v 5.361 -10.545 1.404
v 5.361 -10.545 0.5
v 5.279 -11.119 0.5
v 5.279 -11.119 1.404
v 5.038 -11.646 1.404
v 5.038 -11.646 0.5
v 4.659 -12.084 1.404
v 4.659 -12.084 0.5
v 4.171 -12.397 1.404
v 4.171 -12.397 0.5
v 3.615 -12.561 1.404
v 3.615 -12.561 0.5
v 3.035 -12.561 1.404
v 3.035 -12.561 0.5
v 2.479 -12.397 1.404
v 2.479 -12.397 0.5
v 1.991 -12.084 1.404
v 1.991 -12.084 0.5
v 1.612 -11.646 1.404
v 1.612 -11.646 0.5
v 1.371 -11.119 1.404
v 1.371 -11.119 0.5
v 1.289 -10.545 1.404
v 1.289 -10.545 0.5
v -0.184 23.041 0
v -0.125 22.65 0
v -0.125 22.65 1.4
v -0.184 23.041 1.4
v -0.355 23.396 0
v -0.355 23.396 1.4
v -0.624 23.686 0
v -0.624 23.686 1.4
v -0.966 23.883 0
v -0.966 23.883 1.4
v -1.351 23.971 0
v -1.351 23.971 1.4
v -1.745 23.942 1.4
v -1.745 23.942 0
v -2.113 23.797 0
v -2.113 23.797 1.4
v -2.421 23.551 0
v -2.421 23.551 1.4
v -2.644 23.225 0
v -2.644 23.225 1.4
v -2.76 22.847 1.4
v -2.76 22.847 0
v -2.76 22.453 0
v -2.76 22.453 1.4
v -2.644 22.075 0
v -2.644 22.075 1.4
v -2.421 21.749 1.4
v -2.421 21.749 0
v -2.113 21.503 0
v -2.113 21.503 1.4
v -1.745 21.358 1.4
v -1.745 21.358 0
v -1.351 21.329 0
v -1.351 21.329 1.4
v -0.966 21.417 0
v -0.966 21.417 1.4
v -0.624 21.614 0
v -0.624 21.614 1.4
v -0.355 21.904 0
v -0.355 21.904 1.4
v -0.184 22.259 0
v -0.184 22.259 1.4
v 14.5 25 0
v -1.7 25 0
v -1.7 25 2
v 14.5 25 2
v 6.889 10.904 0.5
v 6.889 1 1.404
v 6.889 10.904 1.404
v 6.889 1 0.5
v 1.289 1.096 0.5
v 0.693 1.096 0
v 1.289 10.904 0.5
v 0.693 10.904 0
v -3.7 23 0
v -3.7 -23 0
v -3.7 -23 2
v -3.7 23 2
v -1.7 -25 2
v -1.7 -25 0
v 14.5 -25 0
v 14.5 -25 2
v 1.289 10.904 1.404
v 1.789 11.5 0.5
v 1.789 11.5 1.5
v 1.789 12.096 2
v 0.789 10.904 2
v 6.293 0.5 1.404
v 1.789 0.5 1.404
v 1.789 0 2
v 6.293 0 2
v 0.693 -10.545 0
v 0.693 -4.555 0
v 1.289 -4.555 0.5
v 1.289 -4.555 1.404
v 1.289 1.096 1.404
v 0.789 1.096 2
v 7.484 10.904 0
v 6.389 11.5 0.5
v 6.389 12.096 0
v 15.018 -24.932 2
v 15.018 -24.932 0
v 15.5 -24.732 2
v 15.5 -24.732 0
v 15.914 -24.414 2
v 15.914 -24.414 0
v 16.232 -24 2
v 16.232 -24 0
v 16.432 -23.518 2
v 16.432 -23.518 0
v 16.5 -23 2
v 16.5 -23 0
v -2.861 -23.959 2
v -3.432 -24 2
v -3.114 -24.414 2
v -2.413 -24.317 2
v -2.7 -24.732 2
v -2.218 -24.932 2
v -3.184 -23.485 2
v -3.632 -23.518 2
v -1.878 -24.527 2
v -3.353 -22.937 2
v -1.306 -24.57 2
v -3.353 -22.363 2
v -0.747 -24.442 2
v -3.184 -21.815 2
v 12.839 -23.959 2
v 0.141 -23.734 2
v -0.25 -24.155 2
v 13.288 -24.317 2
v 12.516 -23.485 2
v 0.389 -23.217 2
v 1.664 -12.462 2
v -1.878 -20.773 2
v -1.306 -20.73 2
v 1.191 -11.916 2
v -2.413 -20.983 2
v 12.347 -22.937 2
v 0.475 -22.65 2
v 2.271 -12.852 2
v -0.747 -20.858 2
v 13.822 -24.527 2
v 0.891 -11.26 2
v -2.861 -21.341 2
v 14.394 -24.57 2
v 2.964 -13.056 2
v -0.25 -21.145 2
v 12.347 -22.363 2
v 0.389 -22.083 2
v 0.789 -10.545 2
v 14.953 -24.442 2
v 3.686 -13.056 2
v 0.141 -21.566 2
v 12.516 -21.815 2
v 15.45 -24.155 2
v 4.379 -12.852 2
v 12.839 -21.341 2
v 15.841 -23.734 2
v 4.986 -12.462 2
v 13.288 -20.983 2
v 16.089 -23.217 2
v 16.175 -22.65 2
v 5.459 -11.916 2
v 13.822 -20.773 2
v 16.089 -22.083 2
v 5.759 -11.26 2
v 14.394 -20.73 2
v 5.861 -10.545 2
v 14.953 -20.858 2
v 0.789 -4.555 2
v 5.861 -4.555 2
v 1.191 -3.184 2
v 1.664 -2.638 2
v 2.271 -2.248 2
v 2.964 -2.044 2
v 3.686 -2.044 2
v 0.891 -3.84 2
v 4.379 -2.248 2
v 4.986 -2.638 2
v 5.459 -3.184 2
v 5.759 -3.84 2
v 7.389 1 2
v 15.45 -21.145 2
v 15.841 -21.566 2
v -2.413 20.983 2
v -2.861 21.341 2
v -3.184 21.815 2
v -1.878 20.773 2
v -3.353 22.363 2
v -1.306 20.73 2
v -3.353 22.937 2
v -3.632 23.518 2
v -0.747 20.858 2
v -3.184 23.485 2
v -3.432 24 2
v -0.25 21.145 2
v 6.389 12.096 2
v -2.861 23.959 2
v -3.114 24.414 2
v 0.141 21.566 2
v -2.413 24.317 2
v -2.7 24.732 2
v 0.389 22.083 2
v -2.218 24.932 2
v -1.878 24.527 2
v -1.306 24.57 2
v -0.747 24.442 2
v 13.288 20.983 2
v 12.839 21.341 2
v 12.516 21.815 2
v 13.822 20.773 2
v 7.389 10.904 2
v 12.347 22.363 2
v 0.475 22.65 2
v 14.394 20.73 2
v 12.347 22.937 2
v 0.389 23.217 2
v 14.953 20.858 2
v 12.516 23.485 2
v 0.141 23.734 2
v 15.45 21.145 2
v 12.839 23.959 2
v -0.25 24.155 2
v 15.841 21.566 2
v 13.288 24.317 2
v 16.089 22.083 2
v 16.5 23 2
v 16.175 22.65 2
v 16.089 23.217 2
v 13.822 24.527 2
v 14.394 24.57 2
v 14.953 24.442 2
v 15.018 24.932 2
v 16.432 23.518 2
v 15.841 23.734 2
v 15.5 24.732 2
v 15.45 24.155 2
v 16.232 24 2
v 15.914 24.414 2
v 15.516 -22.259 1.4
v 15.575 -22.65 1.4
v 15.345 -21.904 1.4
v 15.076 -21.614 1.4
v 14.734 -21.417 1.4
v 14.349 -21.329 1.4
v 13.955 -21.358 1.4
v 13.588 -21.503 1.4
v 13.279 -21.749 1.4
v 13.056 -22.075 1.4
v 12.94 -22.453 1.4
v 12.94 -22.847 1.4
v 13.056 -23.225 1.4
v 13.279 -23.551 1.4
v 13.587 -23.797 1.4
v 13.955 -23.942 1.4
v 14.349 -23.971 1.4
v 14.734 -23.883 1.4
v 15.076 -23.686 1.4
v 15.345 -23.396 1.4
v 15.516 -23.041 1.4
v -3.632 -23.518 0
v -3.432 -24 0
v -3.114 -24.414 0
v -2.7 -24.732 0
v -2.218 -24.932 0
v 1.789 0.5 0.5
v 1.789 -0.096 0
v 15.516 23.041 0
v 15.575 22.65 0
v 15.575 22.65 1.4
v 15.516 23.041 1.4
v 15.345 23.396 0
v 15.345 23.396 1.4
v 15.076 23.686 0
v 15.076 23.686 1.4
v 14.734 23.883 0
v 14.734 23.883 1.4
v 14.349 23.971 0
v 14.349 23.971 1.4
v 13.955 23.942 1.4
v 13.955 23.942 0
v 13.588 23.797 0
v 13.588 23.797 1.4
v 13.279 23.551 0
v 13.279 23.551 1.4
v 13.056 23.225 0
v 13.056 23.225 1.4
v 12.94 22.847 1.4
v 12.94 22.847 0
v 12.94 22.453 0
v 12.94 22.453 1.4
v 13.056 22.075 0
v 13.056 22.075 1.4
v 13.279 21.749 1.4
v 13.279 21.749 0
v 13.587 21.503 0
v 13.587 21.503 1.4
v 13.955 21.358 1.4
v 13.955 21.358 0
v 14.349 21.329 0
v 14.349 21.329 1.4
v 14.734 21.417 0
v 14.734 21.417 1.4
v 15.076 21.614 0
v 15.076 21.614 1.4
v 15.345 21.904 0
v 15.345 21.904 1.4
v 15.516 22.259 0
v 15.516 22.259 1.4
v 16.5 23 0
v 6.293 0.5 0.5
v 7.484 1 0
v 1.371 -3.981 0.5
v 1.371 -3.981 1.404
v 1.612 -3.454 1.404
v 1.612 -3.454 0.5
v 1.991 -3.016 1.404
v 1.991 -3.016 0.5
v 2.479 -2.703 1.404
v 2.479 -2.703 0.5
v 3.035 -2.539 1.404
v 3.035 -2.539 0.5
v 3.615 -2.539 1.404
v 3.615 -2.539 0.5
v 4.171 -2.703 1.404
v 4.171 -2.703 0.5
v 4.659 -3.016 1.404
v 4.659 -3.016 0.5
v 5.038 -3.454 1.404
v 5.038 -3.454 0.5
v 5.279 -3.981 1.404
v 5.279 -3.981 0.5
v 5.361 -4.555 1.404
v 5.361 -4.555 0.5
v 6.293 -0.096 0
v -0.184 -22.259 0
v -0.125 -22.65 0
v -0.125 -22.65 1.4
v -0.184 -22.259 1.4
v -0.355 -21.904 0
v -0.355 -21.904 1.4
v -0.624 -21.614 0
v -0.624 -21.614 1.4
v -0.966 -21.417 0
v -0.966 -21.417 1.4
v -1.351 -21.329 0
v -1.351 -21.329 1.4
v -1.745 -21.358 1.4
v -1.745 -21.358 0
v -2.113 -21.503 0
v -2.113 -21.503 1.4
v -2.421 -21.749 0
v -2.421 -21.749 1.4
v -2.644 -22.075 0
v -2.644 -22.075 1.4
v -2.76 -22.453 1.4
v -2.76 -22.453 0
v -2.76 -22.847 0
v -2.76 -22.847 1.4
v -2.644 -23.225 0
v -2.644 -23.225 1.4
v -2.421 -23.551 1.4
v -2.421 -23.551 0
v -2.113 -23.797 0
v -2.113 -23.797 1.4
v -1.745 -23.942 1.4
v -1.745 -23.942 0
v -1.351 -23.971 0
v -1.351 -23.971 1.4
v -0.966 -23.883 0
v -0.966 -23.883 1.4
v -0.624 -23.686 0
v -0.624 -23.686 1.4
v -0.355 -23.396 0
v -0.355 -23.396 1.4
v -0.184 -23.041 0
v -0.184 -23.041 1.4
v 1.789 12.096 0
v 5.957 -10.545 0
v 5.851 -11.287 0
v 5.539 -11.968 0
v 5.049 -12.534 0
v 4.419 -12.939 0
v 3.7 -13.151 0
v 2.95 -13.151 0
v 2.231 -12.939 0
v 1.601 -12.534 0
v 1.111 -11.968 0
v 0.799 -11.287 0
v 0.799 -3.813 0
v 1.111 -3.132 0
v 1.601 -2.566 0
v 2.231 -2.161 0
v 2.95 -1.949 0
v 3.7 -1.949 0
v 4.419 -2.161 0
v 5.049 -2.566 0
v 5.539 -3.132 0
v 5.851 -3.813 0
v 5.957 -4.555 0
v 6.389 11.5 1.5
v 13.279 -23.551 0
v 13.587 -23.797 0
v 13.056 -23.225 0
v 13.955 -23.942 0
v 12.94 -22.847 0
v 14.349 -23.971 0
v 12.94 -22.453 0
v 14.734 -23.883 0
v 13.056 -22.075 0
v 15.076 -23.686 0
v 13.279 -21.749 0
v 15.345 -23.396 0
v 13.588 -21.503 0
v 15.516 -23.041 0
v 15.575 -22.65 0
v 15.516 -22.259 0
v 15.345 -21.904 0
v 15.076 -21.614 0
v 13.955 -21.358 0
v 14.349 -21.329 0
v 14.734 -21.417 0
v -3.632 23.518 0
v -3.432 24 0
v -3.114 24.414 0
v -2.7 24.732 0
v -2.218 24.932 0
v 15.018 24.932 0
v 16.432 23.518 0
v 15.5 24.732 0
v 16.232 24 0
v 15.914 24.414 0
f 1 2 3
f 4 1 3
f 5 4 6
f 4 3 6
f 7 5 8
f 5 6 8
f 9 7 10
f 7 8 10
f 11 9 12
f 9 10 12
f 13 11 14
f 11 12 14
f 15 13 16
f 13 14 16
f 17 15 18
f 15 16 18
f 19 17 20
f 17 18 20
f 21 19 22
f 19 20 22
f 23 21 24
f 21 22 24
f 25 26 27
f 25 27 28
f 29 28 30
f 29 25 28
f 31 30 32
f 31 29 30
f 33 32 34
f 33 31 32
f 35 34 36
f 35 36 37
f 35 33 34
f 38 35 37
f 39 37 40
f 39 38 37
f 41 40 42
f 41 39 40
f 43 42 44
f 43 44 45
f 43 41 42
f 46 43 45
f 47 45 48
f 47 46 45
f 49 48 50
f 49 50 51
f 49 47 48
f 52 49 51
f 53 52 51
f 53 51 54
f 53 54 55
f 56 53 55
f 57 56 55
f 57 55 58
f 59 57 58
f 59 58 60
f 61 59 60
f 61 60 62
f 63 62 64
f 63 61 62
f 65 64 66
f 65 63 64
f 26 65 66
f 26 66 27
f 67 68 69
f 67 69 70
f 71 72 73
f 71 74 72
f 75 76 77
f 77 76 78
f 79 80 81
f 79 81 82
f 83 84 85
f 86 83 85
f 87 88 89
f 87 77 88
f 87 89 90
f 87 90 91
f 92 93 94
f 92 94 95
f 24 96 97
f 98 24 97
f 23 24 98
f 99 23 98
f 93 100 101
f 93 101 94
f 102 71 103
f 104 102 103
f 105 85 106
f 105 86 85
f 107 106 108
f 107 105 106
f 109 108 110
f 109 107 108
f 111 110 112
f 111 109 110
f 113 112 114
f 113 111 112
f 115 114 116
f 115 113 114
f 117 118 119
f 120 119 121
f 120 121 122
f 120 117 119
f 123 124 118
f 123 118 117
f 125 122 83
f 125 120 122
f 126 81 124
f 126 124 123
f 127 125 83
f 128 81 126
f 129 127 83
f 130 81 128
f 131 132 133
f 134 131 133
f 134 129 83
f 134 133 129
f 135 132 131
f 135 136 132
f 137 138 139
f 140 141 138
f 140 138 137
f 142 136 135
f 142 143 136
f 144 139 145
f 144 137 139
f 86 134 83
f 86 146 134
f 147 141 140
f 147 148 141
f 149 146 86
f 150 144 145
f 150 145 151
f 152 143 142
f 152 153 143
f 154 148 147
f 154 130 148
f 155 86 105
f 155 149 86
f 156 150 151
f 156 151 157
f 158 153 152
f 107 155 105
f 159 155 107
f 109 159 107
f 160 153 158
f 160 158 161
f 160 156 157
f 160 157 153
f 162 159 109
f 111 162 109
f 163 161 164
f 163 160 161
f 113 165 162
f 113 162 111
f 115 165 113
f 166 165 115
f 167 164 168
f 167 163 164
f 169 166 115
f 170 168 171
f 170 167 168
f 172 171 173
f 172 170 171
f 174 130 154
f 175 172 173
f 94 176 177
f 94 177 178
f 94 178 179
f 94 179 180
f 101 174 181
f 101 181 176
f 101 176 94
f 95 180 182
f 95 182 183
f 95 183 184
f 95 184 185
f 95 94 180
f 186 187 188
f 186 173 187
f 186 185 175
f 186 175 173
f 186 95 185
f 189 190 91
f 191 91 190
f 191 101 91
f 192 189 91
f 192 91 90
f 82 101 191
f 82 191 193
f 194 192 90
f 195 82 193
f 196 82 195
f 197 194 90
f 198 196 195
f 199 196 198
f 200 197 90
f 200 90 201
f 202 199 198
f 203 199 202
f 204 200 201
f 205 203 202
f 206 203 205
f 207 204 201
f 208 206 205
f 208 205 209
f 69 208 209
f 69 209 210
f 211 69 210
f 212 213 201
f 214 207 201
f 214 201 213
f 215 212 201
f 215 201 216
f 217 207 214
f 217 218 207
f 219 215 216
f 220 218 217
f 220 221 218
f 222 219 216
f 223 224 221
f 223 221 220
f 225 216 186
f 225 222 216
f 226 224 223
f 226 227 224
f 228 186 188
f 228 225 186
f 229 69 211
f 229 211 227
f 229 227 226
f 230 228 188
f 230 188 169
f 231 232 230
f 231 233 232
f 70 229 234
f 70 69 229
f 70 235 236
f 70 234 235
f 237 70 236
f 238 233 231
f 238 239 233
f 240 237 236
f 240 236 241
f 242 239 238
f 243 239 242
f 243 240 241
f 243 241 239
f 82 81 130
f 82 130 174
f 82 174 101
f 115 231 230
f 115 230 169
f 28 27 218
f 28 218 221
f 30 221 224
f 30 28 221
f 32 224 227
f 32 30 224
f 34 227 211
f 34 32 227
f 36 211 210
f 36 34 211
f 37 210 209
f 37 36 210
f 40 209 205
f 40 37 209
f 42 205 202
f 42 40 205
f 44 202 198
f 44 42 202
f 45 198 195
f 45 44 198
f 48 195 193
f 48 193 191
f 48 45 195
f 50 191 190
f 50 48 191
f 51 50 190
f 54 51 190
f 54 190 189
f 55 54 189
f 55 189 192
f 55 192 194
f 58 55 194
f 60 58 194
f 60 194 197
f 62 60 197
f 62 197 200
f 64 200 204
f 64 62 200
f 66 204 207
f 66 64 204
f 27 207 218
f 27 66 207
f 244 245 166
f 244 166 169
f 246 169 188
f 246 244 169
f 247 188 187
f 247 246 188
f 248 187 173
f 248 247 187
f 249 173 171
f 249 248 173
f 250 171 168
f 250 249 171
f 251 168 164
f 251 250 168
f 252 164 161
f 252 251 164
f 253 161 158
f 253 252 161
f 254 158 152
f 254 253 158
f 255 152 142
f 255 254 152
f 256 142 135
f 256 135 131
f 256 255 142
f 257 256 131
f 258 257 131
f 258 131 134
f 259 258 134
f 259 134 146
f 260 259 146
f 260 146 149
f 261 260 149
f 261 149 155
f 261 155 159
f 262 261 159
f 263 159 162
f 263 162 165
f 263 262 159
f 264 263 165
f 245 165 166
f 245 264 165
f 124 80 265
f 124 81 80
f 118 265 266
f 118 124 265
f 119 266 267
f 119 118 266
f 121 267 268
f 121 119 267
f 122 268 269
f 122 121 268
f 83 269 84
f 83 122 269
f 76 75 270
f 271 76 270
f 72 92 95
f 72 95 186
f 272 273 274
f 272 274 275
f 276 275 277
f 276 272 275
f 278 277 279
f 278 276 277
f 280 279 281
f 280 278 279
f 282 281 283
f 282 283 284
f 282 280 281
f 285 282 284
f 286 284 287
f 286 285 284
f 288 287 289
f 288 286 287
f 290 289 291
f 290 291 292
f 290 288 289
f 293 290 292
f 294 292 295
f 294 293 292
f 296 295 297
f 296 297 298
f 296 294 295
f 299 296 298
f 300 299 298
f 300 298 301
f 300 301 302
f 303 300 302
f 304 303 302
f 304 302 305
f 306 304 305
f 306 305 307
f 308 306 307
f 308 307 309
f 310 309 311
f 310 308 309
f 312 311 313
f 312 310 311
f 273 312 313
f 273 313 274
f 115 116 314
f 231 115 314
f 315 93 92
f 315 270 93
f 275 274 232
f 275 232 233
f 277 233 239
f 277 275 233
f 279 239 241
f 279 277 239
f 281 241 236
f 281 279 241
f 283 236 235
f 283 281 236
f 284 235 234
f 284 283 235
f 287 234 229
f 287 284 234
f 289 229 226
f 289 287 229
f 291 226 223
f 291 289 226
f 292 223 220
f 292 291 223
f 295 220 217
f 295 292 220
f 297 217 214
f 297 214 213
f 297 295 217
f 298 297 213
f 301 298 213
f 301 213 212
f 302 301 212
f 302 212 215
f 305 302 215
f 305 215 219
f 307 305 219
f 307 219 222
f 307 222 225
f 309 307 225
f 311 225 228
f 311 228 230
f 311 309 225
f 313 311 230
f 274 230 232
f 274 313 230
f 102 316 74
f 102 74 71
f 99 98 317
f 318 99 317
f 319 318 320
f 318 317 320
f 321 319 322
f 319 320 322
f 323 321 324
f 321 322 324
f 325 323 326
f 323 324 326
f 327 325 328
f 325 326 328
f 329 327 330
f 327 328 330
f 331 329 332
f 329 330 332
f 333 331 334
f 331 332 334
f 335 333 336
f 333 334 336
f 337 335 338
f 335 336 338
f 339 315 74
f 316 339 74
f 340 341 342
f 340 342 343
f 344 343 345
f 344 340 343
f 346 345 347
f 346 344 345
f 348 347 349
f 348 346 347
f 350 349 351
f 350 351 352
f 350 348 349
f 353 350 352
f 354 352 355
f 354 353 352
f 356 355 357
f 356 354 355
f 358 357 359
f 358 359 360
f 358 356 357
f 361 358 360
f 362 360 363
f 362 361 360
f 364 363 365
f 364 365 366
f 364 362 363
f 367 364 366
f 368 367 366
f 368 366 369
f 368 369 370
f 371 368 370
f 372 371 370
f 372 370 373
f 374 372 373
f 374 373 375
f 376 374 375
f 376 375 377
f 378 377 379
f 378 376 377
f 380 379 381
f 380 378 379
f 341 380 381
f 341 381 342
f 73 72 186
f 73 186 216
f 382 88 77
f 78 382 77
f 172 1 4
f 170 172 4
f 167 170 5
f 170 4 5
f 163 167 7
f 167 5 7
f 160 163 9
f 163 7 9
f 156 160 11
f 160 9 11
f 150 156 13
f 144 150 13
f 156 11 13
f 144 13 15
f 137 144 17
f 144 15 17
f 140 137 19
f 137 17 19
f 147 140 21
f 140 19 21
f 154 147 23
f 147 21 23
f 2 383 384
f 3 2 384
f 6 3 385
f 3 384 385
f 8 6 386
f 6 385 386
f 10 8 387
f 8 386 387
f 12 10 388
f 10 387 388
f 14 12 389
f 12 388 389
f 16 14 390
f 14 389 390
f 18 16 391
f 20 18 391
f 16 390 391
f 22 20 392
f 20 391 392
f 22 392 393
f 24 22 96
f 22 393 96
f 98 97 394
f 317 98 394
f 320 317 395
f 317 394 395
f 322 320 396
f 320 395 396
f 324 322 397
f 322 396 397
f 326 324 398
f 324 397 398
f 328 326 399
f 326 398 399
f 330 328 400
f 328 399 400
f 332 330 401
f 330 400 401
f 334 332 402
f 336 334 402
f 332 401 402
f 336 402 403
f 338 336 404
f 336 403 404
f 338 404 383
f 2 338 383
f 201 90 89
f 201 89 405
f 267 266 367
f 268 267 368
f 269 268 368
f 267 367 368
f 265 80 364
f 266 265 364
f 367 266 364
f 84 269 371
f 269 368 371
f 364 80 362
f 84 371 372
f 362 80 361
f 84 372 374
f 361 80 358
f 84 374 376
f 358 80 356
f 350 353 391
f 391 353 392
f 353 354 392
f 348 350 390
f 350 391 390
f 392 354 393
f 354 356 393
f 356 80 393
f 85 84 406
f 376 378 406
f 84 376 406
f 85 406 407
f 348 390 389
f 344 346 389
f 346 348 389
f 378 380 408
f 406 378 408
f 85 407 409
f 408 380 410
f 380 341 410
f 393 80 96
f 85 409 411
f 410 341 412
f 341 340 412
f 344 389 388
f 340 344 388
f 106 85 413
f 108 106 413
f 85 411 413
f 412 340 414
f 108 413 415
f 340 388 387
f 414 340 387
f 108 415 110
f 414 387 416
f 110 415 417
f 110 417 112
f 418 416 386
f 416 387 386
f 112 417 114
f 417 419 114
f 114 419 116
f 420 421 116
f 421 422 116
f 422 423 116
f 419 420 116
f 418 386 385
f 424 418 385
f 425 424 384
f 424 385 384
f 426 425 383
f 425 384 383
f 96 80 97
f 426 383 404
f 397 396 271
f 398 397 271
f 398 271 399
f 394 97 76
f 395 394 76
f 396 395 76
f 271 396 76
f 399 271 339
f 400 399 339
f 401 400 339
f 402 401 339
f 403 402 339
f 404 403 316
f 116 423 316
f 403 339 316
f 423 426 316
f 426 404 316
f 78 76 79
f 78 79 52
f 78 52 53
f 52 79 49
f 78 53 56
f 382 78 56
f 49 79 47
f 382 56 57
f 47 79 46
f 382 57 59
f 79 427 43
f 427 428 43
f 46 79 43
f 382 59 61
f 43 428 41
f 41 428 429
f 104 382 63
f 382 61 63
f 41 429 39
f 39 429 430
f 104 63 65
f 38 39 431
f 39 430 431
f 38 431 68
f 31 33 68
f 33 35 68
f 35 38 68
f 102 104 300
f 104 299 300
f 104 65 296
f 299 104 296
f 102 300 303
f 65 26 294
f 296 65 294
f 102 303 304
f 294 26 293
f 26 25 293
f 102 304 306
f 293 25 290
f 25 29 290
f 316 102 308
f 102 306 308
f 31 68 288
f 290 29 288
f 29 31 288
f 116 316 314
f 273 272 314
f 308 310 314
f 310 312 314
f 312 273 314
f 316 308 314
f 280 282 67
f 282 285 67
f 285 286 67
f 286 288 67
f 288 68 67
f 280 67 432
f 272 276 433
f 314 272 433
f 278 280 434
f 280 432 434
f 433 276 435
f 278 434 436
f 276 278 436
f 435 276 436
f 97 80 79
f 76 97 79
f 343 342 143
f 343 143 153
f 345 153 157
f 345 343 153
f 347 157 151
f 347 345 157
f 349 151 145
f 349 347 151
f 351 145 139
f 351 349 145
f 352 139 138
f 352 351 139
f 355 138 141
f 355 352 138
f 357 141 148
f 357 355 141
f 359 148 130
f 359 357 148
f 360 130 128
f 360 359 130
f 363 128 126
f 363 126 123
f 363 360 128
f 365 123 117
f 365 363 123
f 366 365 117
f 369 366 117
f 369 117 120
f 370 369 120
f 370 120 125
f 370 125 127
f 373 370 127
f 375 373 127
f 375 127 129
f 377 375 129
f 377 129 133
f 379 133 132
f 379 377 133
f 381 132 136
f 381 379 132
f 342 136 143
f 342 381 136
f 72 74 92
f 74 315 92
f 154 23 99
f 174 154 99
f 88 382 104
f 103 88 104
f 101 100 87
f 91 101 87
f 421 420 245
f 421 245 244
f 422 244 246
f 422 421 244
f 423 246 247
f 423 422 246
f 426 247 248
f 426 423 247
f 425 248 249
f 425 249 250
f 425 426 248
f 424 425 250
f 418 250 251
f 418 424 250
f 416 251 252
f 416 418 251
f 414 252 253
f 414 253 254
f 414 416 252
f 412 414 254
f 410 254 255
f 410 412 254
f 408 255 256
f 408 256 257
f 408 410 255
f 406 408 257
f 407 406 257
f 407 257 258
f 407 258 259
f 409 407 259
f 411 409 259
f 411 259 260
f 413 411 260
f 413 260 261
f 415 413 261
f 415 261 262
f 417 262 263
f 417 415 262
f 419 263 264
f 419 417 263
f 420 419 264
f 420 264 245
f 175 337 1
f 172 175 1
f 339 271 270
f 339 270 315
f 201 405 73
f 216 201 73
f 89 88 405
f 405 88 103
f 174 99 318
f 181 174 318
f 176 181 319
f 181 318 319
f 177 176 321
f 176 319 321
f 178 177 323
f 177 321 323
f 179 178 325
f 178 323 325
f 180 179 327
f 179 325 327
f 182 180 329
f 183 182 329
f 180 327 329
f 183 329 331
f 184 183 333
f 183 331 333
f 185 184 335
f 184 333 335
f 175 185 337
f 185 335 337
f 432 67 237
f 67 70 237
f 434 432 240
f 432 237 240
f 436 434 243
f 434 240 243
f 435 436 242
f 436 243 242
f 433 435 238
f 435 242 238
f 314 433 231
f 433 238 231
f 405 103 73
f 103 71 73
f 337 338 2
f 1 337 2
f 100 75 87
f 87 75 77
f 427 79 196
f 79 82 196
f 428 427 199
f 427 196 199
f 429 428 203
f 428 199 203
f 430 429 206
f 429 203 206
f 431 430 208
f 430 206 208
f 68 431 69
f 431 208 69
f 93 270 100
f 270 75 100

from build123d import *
from OCP.BRepFilletAPI import BRepFilletAPI_MakeChamfer

# Parameters (mm, degrees)
SKETCH_2_W      = 20.2
SKETCH_2_H      = 50
SKETCH_2_R      = 1.325
SKETCH_2_W_2    = 5.6
SKETCH_2_H_2    = 11
EXTRUDE_1_DEPTH = 2
FILLET_1_R      = 2
CHAMFER_1_SIZE  = 0.6
CHAMFER_2_SIZE  = 0.5
CHAMFER_2_SIZE2 = 0.595876796


with BuildPart() as part:
    # 草图2 → 凸台-拉伸1 (new body)
    with BuildSketch(Plane.XY):
        with Locations((6.4, 0)):
            Rectangle(SKETCH_2_W, SKETCH_2_H)
        with Locations((-1.45, -22.65)):
            Circle(SKETCH_2_R, mode=Mode.SUBTRACT)
        with Locations((-1.45, 22.65)):
            Circle(SKETCH_2_R, mode=Mode.SUBTRACT)
        with Locations((14.25, 22.65)):
            Circle(SKETCH_2_R, mode=Mode.SUBTRACT)
        with Locations((14.25, -22.65)):
            Circle(SKETCH_2_R, mode=Mode.SUBTRACT)
        with BuildLine():
            Line((5.361456992, -4.555), (5.361456992, -10.545))
            ThreePointArc((5.361456992, -10.545), (3.325, -12.581456992), (1.288543008, -10.545))
            Line((1.288543008, -10.545), (1.288543008, -4.555))
            ThreePointArc((1.288543008, -4.555), (3.325, -2.518543008), (5.361456992, -4.555))
        make_face(mode=Mode.SUBTRACT)
        with Locations((4.088543008, 6)):
            Rectangle(SKETCH_2_W_2, SKETCH_2_H_2, mode=Mode.SUBTRACT)
    extrude(amount=EXTRUDE_1_DEPTH)

    # 圆角1
    fillet_1_edges = [part.edges().sort_by_distance(p)[0] for p in [
        (-3.7, 25, 1),
        (16.5, 25, 1),
        (16.5, -25, 1),
        (-3.7, -25, 1),
    ]]
    fillet(fillet_1_edges, radius=FILLET_1_R)

    # 倒角1
    chamfer_1_edges = [part.edges().sort_by_distance(p)[0] for p in [
        (-2.775, -22.65, 2),
        (-2.775, 22.65, 2),
        (12.925, 22.65, 2),
        (12.925, -22.65, 2),
    ]]
    chamfer(chamfer_1_edges, length=CHAMFER_1_SIZE)

    # 倒角2: one chamfer whose edges measure the first distance from different faces: ONE call of the kernel's chamfer builder (chamfer() names one face for all edges)
    chamfer_2_edges_1 = [part.edges().sort_by_distance(p)[0] for p in [
        (3.325, -2.518543008, 0),
    ]]
    chamfer_2_side_1 = [part.faces().sort_by_distance(p)[0] for p in [
        (3.325, -2.518543008, 1),
    ]]
    chamfer_2_edges_2 = [part.edges().sort_by_distance(p)[0] for p in [
        (1.288543008, -7.55, 0),
    ]]
    chamfer_2_side_2 = [part.faces().sort_by_distance(p)[0] for p in [
        (1.288543008, -7.55, 1),
    ]]
    chamfer_2_edges_3 = [part.edges().sort_by_distance(p)[0] for p in [
        (3.325, -12.581456992, 0),
    ]]
    chamfer_2_side_3 = [part.faces().sort_by_distance(p)[0] for p in [
        (3.325, -12.581456992, 1),
    ]]
    chamfer_2_edges_4 = [part.edges().sort_by_distance(p)[0] for p in [
        (5.361456992, -7.55, 0),
    ]]
    chamfer_2_side_4 = [part.faces().sort_by_distance(p)[0] for p in [
        (5.361456992, -7.55, 1),
    ]]
    chamfer_2_edges_5 = [part.edges().sort_by_distance(p)[0] for p in [
        (3.325, -2.518543008, 2),
        (1.288543008, -7.55, 2),
        (3.325, -12.581456992, 2),
        (5.361456992, -7.55, 2),
        (1.288543008, 6, 2),
        (4.088543008, 0.5, 2),
        (6.888543008, 6, 2),
    ]]
    chamfer_2_side_5 = [part.faces().sort_by_distance(p)[0] for p in [
        (6.699043587, -0.101092382, 2),
    ]]
    chamfer_2_edges_6 = [part.edges().sort_by_distance(p)[0] for p in [
        (1.288543008, 6, 0),
    ]]
    chamfer_2_side_6 = [part.faces().sort_by_distance(p)[0] for p in [
        (1.288543008, 6, 1),
    ]]
    chamfer_2_edges_7 = [part.edges().sort_by_distance(p)[0] for p in [
        (1.288543008, 11.5, 1),
        (4.088543008, 11.5, 0),
        (6.888543008, 11.5, 1),
        (4.088543008, 11.5, 2),
    ]]
    chamfer_2_side_7 = [part.faces().sort_by_distance(p)[0] for p in [
        (4.088543008, 11.5, 1),
    ]]
    chamfer_2_edges_8 = [part.edges().sort_by_distance(p)[0] for p in [
        (4.088543008, 0.5, 0),
        (1.288543008, 0.5, 1),
    ]]
    chamfer_2_side_8 = [part.faces().sort_by_distance(p)[0] for p in [
        (4.088543008, 0.5, 1),
    ]]
    chamfer_2_edges_9 = [part.edges().sort_by_distance(p)[0] for p in [
        (6.888543008, 6, 0),
        (6.888543008, 0.5, 1),
    ]]
    chamfer_2_side_9 = [part.faces().sort_by_distance(p)[0] for p in [
        (6.888543008, 6, 1),
    ]]
    chamfer_2 = BRepFilletAPI_MakeChamfer(part.part.solid().wrapped)
    for e in chamfer_2_edges_1:
        chamfer_2.Add(CHAMFER_2_SIZE, CHAMFER_2_SIZE2, e.wrapped, chamfer_2_side_1[0].wrapped)  # the first distance lies on this face
    for e in chamfer_2_edges_2:
        chamfer_2.Add(CHAMFER_2_SIZE, CHAMFER_2_SIZE2, e.wrapped, chamfer_2_side_2[0].wrapped)  # the first distance lies on this face
    for e in chamfer_2_edges_3:
        chamfer_2.Add(CHAMFER_2_SIZE, CHAMFER_2_SIZE2, e.wrapped, chamfer_2_side_3[0].wrapped)  # the first distance lies on this face
    for e in chamfer_2_edges_4:
        chamfer_2.Add(CHAMFER_2_SIZE, CHAMFER_2_SIZE2, e.wrapped, chamfer_2_side_4[0].wrapped)  # the first distance lies on this face
    for e in chamfer_2_edges_5:
        chamfer_2.Add(CHAMFER_2_SIZE, CHAMFER_2_SIZE2, e.wrapped, chamfer_2_side_5[0].wrapped)  # the first distance lies on this face
    for e in chamfer_2_edges_6:
        chamfer_2.Add(CHAMFER_2_SIZE, CHAMFER_2_SIZE2, e.wrapped, chamfer_2_side_6[0].wrapped)  # the first distance lies on this face
    for e in chamfer_2_edges_7:
        chamfer_2.Add(CHAMFER_2_SIZE, CHAMFER_2_SIZE2, e.wrapped, chamfer_2_side_7[0].wrapped)  # the first distance lies on this face
    for e in chamfer_2_edges_8:
        chamfer_2.Add(CHAMFER_2_SIZE, CHAMFER_2_SIZE2, e.wrapped, chamfer_2_side_8[0].wrapped)  # the first distance lies on this face
    for e in chamfer_2_edges_9:
        chamfer_2.Add(CHAMFER_2_SIZE, CHAMFER_2_SIZE2, e.wrapped, chamfer_2_side_9[0].wrapped)  # the first distance lies on this face
    add(Compound.cast(chamfer_2.Shape()), mode=Mode.REPLACE)


solid = part.part
